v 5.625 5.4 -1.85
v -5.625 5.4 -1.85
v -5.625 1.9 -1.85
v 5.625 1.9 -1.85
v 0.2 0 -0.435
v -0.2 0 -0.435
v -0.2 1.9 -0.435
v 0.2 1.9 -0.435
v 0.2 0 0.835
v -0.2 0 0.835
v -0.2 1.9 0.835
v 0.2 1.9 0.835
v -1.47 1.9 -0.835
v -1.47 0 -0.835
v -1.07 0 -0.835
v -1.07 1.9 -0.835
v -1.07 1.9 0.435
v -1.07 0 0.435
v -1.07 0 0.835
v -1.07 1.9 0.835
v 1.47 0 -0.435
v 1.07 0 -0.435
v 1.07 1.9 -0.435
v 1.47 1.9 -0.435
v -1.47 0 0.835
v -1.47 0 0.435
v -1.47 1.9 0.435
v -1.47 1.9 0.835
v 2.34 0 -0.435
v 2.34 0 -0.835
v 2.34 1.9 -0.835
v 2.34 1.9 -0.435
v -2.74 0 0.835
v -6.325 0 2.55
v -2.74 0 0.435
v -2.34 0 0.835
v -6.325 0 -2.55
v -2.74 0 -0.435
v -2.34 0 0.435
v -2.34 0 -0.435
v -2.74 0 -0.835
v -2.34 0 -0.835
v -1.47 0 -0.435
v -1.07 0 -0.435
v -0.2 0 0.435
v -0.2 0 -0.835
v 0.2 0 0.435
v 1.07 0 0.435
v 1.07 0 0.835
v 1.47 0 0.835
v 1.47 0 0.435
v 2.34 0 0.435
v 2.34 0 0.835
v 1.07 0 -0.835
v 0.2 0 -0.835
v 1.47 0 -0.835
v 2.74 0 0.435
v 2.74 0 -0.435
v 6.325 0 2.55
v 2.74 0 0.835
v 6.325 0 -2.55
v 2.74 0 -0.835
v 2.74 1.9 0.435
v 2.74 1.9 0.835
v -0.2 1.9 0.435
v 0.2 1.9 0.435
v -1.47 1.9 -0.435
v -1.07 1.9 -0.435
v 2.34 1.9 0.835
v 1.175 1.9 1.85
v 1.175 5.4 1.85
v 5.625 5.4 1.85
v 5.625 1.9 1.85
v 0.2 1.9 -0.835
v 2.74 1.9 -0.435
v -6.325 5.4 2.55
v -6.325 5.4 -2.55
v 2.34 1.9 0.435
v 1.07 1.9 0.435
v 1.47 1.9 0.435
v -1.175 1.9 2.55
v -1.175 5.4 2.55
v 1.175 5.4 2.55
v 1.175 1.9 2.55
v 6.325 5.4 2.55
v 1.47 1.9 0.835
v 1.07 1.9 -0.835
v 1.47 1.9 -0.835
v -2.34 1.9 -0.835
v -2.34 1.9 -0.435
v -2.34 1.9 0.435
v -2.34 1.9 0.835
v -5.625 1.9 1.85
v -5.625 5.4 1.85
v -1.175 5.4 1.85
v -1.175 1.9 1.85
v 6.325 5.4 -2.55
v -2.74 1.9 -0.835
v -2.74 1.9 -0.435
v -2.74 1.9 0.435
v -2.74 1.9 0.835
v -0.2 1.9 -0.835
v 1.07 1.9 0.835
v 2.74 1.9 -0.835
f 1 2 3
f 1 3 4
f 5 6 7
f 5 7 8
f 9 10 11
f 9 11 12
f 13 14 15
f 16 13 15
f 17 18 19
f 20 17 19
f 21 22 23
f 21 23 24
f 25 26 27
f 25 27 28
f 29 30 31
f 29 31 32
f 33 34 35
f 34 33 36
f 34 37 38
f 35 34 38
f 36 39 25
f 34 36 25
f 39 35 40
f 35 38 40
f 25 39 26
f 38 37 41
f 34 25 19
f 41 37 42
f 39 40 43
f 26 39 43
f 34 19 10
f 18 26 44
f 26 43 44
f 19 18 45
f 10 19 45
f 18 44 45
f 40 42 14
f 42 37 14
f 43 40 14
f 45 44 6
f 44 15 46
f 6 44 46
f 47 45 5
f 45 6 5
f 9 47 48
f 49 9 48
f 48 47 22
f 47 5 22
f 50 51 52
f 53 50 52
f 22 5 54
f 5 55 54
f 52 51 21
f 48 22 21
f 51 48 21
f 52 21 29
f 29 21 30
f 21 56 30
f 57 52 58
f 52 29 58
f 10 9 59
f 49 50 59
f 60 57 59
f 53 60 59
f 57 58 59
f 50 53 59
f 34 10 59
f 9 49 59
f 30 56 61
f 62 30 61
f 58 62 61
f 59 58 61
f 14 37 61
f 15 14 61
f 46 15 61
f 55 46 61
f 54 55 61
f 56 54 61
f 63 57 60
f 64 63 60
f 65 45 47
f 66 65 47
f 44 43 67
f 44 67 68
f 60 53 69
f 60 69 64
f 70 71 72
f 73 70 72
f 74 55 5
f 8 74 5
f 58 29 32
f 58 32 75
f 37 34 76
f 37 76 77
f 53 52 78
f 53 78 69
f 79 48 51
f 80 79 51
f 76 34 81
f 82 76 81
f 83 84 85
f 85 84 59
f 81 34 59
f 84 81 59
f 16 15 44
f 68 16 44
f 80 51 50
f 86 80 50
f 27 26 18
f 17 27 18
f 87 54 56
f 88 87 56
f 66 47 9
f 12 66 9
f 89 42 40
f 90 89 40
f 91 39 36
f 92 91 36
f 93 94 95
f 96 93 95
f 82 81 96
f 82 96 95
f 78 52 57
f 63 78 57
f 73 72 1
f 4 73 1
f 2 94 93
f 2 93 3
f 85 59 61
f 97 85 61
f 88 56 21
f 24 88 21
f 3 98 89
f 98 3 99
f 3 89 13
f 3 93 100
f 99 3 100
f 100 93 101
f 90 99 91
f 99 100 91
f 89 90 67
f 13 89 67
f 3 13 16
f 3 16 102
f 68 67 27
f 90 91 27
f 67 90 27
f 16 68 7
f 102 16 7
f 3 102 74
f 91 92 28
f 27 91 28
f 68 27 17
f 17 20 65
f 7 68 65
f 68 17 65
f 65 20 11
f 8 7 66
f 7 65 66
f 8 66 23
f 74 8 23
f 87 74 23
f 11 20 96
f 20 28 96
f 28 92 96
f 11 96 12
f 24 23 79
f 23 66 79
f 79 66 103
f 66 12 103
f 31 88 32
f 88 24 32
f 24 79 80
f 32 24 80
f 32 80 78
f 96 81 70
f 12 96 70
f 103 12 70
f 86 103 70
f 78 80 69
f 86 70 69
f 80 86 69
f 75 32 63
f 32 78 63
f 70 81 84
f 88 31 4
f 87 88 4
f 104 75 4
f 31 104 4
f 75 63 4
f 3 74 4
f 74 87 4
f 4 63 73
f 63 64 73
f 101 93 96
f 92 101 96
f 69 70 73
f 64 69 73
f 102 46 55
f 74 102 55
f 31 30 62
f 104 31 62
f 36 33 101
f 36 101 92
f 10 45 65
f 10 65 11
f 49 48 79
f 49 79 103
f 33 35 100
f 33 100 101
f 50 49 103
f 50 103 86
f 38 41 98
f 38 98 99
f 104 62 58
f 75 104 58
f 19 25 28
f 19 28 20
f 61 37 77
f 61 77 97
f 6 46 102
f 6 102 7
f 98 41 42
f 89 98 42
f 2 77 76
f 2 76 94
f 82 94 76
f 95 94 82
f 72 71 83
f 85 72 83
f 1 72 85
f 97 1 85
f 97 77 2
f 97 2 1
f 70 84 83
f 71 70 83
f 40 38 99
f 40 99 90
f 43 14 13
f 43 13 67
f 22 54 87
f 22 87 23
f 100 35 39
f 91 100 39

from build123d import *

# Parameters (mm, degrees)
SKETCH1_W            = 12.65
SKETCH1_H            = 5.1
BOSS_EXTRUDE1_DEPTH  = 5.4
SKETCH2_W            = 11.25
SKETCH2_H            = 3.7
CUT_EXTRUDE1_DEPTH   = 3.5
CUT_EXTRUDE2_REACH   = 11.756
SKETCH3_W            = 2.35
SKETCH3_H            = 3.5
CUT_EXTRUDE5_REACH   = 10.699
SKETCH4_W            = 0.4
SKETCH4_H            = 0.4
LPATTERN1_COUNT      = 5
LPATTERN1_PITCH      = 1.27
LPATTERN1_COUNT_DIR2 = 2
LPATTERN1_PITCH_DIR2 = 1.27


with BuildPart() as part:
    # Sketch1 → Boss-Extrude1 (new body)
    with BuildSketch(Plane(origin=(0, 0, 0), x_dir=(1, 0, 0), z_dir=(0, 1, 0))):
        Rectangle(SKETCH1_W, SKETCH1_H)
    extrude(amount=BOSS_EXTRUDE1_DEPTH)

    # Sketch2 → Cut-Extrude1 (cut)
    with BuildSketch(Plane(origin=(0, 5.4, 0), x_dir=(1, 0, 0), z_dir=(0, 1, 0))):
        Rectangle(SKETCH2_W, SKETCH2_H)
    extrude(amount=-CUT_EXTRUDE1_DEPTH, mode=Mode.SUBTRACT)

    # Sketch3 → Cut-Extrude2 (cut, up to next)
    with BuildSketch(Plane.XY.offset(2.55), mode=Mode.PRIVATE) as cut_extrude2_sk1:
        with Locations((0, 3.65)):
            Rectangle(SKETCH3_W, SKETCH3_H)
    cut_extrude2_tool1 = extrude(cut_extrude2_sk1.sketch, amount=-CUT_EXTRUDE2_REACH, mode=Mode.PRIVATE) & part.part
    add(cut_extrude2_tool1.solids().sort_by_distance((0, 3.65, 2.55))[0], mode=Mode.SUBTRACT)

    # Sketch4 → Cut-Extrude5 (cut, up to next)
    with BuildSketch(Plane.XZ, mode=Mode.PRIVATE) as cut_extrude5_sk1:
        with Locations((-2.54, 0.635)):
            Rectangle(SKETCH4_W, SKETCH4_H)
    cut_extrude5_tool1 = extrude(cut_extrude5_sk1.sketch, amount=-CUT_EXTRUDE5_REACH, mode=Mode.PRIVATE) & part.part
    cut_extrude5 = cut_extrude5_tool1.solids().sort_by_distance((-2.54, 0, 0.635))[0]
    add(cut_extrude5, mode=Mode.SUBTRACT)

    # LPattern1: Cut-Extrude5 5 × 2
    with Locations(*[(i * LPATTERN1_PITCH, 0, -j * LPATTERN1_PITCH_DIR2) for i in range(LPATTERN1_COUNT) for j in range(LPATTERN1_COUNT_DIR2) if (i, j) != (0, 0)]):
        add(cut_extrude5, mode=Mode.SUBTRACT)


solid = part.part
